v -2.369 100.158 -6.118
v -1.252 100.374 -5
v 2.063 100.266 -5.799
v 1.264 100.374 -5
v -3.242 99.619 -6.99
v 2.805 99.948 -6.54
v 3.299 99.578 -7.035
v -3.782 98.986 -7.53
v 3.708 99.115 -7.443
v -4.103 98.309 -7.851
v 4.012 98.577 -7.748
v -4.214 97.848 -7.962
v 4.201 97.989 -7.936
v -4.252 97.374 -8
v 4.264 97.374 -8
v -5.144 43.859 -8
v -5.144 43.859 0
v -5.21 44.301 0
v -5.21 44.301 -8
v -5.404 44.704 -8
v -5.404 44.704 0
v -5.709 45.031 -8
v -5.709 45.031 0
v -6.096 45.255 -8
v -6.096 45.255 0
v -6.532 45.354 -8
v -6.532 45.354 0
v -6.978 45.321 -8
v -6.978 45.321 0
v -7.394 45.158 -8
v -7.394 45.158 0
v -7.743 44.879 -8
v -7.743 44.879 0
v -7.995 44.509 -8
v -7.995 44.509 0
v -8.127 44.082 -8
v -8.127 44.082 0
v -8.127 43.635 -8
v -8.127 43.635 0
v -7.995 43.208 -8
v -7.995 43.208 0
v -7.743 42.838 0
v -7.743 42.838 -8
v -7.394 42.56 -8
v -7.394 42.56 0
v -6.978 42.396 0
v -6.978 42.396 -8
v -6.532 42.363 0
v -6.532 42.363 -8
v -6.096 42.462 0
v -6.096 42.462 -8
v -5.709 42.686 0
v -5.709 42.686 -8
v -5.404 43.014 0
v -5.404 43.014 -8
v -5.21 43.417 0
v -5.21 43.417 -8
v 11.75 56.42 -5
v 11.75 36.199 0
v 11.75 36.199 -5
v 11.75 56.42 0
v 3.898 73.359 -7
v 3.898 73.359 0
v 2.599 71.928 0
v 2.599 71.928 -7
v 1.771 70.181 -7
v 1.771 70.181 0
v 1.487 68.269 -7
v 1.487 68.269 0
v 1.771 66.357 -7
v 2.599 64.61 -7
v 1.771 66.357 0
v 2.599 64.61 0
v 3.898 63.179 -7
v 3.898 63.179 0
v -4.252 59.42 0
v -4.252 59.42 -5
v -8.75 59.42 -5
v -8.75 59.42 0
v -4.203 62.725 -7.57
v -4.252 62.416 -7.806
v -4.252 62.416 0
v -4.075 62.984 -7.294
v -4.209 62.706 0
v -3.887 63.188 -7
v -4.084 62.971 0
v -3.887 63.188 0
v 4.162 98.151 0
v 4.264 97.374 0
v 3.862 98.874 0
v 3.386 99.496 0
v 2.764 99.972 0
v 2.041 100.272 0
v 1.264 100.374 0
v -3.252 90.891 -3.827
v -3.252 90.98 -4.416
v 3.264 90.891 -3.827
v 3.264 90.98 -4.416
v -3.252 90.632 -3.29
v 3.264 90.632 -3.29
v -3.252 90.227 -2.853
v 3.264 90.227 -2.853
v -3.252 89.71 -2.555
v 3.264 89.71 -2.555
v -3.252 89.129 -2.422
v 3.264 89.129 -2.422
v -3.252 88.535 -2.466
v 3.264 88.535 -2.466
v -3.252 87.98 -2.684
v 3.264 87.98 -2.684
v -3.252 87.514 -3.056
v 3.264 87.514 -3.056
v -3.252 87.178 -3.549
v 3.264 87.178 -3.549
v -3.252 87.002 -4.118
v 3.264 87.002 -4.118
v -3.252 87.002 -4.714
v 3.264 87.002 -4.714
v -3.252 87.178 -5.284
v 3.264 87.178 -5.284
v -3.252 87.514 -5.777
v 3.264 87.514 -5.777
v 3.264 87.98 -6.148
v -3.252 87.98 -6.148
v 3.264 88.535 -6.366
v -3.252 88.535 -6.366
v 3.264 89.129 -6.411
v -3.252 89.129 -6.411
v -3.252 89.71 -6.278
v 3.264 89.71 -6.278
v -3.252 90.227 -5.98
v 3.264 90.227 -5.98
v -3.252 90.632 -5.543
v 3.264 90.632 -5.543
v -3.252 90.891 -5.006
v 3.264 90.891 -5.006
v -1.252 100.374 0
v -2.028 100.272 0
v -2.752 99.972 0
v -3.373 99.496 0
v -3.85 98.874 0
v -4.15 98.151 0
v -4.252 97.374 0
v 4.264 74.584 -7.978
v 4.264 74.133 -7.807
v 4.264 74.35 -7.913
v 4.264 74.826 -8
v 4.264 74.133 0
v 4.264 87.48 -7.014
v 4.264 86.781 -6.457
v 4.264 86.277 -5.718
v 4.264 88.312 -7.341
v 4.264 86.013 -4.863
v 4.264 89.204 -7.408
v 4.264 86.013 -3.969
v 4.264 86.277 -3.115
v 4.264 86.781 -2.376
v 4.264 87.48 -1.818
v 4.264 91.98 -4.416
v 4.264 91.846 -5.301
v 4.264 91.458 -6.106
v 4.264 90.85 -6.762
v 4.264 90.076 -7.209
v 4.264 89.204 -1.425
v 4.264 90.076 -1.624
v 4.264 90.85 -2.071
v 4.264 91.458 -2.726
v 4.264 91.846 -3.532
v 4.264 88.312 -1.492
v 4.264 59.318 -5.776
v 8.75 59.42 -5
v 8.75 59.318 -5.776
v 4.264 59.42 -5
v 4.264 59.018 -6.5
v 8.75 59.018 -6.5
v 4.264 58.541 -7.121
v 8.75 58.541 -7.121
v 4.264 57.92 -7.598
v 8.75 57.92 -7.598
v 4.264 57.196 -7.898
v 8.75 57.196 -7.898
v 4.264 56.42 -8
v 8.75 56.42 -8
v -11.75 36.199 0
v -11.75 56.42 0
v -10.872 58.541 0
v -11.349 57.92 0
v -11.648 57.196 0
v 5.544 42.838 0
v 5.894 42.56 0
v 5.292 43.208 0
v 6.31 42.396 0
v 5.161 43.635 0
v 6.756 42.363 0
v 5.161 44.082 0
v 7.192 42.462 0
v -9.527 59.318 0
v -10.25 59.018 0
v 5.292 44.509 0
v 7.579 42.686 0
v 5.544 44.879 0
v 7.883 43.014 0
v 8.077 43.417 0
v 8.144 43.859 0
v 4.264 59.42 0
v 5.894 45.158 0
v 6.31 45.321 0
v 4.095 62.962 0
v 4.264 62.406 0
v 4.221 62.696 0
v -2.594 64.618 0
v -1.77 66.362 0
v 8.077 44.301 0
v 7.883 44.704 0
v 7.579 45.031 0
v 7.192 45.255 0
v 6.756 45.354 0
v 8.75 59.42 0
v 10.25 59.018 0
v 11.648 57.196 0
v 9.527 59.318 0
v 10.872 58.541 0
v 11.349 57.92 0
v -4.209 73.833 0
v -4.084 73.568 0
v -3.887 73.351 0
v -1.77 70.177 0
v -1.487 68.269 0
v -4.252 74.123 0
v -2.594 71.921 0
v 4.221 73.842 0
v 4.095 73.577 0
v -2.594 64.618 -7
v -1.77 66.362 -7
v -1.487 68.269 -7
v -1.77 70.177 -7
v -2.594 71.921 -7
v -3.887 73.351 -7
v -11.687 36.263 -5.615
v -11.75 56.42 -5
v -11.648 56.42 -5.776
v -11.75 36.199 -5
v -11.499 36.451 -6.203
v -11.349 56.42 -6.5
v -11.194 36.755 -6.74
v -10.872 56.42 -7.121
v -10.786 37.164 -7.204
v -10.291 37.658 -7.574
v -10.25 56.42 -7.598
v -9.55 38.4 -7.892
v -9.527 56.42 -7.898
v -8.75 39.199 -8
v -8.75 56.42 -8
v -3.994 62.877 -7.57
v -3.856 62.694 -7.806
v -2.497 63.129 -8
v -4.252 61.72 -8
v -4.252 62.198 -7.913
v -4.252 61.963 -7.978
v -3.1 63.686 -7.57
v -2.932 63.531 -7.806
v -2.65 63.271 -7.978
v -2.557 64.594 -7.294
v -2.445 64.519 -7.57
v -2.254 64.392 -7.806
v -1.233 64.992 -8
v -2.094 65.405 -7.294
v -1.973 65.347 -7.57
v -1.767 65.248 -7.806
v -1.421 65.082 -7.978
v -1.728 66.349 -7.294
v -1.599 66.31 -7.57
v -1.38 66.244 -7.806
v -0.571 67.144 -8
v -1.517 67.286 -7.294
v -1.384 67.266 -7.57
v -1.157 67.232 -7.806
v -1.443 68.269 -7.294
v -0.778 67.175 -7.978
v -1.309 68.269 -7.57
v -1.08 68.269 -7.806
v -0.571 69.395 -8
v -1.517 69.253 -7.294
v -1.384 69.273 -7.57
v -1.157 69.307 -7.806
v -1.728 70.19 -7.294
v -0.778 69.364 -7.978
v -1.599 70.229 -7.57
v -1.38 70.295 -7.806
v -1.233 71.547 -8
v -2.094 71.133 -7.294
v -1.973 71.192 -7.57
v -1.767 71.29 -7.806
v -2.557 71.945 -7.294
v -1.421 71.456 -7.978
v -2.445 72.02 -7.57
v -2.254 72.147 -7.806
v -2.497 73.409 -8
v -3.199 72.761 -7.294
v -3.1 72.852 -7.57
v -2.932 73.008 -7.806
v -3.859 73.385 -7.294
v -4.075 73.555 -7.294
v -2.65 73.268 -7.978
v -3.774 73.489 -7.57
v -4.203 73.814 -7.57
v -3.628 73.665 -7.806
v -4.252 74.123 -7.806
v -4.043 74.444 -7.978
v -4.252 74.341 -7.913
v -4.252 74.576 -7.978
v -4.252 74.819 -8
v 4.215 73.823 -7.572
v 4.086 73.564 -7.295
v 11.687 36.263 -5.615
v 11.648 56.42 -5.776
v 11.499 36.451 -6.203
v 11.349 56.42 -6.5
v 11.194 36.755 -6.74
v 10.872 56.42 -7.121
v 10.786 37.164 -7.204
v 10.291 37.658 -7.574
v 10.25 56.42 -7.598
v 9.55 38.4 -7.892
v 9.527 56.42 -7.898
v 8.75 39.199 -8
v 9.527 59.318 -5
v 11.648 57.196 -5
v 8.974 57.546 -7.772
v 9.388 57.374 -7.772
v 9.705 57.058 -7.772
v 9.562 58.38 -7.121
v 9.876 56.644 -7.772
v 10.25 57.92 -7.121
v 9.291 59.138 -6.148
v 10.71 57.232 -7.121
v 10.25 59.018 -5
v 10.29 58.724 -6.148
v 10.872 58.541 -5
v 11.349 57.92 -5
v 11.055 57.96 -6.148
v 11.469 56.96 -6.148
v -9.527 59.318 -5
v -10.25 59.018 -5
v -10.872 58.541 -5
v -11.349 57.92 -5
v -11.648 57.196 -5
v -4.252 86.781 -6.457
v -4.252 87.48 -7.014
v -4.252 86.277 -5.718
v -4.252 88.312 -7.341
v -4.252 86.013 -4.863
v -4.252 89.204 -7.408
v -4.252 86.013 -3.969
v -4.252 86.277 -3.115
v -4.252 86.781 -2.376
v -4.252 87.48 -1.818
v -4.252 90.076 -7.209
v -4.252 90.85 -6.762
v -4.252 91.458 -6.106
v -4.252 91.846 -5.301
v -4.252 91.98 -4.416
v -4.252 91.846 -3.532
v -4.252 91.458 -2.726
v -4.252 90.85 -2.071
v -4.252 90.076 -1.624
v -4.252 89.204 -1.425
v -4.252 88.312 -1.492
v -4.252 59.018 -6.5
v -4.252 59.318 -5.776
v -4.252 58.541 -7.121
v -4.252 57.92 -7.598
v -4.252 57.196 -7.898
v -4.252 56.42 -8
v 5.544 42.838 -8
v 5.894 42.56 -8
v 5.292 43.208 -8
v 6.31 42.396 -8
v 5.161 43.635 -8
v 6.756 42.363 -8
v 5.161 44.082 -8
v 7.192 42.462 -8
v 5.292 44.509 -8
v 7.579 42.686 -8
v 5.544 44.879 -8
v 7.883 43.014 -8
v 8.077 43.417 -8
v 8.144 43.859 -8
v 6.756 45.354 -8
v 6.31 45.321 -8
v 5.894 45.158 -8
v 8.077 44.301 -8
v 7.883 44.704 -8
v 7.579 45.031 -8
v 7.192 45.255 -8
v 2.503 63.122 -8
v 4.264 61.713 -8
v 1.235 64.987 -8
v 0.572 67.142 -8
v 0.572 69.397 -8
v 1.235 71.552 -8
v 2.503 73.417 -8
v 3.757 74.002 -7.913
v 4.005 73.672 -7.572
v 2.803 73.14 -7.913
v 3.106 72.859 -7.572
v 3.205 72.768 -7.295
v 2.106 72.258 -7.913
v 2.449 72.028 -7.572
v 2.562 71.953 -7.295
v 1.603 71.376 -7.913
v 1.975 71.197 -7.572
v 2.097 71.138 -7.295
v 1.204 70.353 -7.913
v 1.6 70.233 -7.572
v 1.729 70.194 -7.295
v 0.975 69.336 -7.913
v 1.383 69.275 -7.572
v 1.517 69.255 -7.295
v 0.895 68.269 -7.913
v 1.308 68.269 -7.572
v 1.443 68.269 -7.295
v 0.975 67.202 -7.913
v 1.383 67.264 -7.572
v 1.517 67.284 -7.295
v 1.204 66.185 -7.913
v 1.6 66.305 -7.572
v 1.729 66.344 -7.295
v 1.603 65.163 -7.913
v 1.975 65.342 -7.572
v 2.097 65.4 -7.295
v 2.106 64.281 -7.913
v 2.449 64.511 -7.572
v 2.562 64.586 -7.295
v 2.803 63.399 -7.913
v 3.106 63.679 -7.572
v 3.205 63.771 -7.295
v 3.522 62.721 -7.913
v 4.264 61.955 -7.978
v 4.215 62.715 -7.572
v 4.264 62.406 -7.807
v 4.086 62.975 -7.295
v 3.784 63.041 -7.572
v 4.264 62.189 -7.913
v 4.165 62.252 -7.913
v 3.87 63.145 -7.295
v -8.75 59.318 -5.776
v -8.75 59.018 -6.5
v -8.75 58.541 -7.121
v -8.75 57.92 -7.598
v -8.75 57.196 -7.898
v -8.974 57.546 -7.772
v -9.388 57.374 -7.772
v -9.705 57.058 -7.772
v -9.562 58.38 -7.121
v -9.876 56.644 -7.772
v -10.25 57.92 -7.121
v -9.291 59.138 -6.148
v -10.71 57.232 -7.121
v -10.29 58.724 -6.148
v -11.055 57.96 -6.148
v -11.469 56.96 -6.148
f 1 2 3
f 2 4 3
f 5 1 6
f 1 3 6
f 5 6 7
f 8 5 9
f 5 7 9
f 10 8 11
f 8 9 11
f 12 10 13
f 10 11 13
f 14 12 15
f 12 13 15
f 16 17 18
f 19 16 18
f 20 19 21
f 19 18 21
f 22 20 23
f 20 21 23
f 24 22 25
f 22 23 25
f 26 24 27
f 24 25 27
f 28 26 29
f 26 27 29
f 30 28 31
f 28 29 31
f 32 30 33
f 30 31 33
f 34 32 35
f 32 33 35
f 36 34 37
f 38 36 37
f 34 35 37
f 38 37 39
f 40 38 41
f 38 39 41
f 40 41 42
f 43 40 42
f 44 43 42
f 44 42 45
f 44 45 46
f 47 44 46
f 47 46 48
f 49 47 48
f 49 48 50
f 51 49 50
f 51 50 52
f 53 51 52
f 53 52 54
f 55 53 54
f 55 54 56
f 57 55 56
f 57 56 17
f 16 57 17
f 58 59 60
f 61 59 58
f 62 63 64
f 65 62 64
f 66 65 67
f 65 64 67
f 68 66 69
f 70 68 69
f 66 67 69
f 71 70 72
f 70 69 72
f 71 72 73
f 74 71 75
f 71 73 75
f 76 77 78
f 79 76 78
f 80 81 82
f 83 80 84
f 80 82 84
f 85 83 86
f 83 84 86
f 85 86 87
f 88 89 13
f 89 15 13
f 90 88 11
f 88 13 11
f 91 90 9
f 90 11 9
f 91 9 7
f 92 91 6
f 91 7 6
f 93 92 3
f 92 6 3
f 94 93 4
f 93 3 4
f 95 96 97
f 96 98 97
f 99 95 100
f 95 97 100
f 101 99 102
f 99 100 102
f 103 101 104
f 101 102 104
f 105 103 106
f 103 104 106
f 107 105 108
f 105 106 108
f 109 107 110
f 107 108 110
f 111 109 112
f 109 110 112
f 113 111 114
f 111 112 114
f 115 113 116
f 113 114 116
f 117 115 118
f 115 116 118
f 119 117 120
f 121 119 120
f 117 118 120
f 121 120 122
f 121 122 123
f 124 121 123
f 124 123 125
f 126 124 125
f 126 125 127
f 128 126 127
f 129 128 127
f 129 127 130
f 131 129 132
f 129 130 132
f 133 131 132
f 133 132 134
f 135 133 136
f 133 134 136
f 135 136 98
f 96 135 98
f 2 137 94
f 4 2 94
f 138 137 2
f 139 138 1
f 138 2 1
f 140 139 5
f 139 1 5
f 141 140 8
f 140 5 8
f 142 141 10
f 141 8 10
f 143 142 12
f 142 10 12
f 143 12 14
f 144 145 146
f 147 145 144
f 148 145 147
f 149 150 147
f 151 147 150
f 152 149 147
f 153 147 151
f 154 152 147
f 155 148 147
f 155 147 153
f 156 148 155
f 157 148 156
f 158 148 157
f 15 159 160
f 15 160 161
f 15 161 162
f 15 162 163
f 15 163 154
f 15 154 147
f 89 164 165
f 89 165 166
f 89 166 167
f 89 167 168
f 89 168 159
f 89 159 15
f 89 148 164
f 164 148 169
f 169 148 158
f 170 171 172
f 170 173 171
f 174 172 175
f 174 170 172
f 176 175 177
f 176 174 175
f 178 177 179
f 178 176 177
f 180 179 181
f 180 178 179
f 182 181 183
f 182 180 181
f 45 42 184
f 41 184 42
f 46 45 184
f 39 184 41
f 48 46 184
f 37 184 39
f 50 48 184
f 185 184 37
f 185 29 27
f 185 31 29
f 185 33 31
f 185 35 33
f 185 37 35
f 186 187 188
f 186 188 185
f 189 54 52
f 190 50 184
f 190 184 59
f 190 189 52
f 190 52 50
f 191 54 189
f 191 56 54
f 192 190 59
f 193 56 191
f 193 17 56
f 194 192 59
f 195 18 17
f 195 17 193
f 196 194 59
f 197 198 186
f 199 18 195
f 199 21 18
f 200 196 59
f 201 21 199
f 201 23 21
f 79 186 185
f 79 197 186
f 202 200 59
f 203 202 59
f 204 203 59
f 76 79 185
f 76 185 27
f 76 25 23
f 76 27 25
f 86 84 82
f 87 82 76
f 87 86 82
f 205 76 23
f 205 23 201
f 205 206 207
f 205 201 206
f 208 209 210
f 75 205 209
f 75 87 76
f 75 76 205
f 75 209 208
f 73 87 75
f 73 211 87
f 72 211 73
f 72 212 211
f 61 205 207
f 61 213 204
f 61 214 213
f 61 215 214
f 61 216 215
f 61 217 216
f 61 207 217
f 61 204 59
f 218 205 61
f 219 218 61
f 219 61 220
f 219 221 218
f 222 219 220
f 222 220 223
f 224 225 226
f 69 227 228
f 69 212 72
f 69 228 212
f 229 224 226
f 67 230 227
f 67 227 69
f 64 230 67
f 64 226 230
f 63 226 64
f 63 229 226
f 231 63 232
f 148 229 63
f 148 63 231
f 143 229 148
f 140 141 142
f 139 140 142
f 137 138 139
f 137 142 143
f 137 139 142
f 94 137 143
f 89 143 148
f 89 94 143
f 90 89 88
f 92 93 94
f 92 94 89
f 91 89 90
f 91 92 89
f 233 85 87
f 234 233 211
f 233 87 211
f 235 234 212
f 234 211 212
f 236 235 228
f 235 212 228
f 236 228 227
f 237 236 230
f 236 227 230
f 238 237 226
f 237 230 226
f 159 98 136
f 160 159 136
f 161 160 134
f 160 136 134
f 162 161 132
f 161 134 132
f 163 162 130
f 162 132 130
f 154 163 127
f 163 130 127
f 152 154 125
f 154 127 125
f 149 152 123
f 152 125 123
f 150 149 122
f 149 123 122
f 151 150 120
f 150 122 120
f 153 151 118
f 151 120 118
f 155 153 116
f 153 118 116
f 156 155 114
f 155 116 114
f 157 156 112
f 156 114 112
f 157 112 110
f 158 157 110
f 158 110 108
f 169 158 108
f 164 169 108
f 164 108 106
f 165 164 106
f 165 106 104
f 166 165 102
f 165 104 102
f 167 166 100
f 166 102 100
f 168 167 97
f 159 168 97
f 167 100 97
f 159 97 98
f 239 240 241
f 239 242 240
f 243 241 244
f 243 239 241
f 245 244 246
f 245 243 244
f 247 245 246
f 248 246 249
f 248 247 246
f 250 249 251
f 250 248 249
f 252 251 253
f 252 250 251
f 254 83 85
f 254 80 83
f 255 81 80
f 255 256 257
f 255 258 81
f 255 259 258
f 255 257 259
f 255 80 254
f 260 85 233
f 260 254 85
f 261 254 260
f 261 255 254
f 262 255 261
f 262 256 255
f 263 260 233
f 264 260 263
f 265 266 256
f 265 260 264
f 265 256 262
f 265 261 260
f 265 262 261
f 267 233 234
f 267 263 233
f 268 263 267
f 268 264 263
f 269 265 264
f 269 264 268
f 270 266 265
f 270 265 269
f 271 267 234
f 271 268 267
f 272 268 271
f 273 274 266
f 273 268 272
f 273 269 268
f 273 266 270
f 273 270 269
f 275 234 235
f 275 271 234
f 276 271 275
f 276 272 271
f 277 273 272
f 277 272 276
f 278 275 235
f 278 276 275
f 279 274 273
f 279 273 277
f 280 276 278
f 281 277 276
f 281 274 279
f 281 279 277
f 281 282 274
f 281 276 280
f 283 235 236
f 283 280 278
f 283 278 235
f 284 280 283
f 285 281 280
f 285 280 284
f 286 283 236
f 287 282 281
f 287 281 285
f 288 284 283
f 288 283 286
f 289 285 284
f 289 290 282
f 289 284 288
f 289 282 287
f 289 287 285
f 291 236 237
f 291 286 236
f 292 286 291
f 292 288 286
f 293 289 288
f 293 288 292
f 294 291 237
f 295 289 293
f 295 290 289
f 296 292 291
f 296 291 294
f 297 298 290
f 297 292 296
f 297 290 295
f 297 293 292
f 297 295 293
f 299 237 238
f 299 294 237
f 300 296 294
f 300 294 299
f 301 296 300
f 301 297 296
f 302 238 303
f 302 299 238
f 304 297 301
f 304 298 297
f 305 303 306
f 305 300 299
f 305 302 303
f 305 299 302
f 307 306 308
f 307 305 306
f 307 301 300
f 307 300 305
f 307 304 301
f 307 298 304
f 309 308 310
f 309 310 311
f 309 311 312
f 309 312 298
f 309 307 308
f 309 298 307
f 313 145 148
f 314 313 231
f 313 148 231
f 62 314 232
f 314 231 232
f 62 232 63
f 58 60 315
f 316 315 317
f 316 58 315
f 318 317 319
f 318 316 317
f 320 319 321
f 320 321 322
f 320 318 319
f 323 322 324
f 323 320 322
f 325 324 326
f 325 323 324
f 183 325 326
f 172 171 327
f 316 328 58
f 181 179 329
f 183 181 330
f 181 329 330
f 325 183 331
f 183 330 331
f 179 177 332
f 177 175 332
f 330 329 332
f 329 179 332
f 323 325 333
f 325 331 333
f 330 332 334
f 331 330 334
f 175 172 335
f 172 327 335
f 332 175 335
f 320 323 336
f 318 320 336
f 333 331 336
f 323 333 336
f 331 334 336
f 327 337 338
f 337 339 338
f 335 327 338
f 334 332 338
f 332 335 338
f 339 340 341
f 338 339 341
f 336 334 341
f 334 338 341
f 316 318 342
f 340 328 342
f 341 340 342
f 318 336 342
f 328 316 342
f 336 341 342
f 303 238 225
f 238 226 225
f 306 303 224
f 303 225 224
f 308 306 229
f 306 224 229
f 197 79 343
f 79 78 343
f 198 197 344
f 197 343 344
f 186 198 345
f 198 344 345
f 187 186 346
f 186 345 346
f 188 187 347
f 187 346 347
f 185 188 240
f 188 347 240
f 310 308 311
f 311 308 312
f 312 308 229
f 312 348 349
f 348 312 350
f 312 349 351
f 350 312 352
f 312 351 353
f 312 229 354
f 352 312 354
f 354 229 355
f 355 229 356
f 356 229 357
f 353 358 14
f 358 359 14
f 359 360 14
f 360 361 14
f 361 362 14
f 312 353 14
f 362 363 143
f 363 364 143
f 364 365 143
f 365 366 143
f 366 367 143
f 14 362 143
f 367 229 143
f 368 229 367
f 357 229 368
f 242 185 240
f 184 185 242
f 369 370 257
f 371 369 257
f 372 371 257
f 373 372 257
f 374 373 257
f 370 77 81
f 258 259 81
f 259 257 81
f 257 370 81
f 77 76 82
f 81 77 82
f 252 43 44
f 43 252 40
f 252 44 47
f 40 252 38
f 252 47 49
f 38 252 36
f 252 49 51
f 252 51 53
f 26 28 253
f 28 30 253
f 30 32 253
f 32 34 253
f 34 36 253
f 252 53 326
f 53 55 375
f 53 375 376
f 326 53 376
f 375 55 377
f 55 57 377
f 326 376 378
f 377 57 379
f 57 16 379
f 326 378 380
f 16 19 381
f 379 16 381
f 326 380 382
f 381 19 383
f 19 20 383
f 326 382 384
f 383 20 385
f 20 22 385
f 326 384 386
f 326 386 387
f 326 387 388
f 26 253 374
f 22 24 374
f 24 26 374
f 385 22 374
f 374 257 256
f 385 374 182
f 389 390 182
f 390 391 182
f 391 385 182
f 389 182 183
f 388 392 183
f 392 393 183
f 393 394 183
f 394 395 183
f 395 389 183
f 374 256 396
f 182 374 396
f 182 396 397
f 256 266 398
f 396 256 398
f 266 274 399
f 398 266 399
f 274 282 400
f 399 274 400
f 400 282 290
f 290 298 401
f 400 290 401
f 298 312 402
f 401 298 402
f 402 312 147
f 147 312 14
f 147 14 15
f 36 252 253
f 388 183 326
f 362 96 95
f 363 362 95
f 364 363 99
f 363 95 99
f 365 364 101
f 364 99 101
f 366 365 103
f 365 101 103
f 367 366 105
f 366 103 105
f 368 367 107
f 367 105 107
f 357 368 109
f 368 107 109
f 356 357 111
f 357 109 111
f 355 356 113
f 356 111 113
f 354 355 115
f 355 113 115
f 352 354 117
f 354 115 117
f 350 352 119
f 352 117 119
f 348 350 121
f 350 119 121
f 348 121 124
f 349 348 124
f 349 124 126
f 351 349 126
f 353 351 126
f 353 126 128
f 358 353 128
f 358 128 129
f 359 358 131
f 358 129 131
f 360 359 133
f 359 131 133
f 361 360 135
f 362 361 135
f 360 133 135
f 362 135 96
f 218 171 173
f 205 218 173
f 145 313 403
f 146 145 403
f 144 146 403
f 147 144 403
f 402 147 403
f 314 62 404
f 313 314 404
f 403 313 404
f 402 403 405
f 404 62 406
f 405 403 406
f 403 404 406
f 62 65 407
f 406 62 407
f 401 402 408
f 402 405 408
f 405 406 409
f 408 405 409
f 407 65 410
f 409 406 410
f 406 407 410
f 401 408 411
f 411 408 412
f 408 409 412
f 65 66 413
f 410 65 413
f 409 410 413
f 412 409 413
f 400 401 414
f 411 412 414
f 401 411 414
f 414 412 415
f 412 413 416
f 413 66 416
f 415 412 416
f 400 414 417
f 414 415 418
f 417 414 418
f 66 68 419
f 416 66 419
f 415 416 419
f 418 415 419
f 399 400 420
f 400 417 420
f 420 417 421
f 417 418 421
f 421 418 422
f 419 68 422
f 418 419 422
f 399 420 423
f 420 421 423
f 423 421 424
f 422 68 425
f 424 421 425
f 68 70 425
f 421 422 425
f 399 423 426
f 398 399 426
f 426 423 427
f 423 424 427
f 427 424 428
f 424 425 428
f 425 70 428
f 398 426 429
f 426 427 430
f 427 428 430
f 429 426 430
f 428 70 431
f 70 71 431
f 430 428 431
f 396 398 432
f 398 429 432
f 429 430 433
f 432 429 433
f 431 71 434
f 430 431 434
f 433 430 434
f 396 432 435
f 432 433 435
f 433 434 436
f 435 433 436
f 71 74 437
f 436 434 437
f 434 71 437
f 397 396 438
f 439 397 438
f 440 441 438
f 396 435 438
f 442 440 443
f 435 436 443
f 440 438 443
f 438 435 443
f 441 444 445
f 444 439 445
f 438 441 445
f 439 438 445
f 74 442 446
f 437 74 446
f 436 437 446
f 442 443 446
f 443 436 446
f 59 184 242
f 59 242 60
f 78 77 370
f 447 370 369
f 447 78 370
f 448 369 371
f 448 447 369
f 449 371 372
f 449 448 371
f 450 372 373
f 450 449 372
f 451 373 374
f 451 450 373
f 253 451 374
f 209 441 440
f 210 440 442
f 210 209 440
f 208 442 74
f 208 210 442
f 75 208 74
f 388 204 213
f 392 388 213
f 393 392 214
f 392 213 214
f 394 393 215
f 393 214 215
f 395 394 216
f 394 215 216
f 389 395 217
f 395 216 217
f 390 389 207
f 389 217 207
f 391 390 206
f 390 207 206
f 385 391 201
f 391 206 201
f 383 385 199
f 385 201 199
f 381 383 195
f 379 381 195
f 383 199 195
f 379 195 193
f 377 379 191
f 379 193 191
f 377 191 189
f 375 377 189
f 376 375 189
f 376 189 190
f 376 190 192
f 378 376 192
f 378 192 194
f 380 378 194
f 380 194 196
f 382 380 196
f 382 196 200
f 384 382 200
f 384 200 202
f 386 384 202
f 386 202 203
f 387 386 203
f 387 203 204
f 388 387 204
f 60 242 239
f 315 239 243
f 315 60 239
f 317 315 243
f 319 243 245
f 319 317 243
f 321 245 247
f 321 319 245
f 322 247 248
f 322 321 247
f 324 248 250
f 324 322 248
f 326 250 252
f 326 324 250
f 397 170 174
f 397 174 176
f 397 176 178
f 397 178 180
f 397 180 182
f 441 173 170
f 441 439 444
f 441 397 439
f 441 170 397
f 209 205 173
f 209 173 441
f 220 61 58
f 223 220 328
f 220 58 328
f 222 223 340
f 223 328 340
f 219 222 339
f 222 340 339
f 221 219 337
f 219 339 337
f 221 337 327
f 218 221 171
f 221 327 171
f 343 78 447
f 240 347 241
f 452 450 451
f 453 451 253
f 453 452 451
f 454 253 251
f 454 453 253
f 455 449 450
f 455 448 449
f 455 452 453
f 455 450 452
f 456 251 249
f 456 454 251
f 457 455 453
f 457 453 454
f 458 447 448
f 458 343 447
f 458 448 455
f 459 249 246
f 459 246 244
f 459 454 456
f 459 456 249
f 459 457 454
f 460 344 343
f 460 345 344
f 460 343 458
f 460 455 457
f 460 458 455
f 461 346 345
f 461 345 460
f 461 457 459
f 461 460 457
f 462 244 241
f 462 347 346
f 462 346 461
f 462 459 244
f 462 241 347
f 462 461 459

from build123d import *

# Parameters (mm, degrees)
F0_W          = 8.5162539035
F0_H          = 18.7663150777
F0_H_2        = 40.954434668
F1_DEPTH      = 8
F2_R          = 3
F3_R          = 1.5
F4_DEPTH      = 25
F5_R          = 2
F6_DEPTH      = 13.4
F6_DEPTH_BACK = 25
F7_SIZE       = 1
F8_R          = 6.5791532239
F9_DEPTH      = 25
F10_R         = 1


with BuildPart() as f1:
    # F0 (on Top) → F1 (new body)
    with BuildSketch(Plane.XY):
        Polygon((11.7504801601, 36.198887974), (11.7504801601, 59.4197693529), (4.2642612243, 59.4197693529), (4.2642612243, 40.6534542753), (-4.2519926792, 40.6534542753), (-4.2519926792, 59.4197693529), (-11.7504801601, 59.4197693529), (-11.7504801601, 36.198887974), align=None)
        with Locations((0.0061342726, 50.0366118141)):
            Rectangle(F0_W, F0_H)
        with Locations((0.0061342726, 79.8969866869)):
            Rectangle(F0_W, F0_H_2)
    extrude(amount=-F1_DEPTH)

    # F2
    f2_edges = [f1.edges().sort_by_distance(p)[0] for p in [
        (-11.75048, 59.419769, -4),
        (11.75048, 59.419769, -4),
        (-4.251993, 100.374204, -4),
        (4.264261, 100.374204, -4),
        (0, 36.198888, -8),
        (-8.001236, 59.419769, -8),
        (8.007371, 59.419769, -8),
        (-11.75048, 47.809329, -8),
        (11.75048, 47.809329, -8),
        (0.006134, 100.374204, -8),
    ]]
    fillet(f2_edges, radius=F2_R)

    # F3 (on Top) → F4 (cut)
    with BuildSketch(Plane.XY):
        with Locations((-6.6438065842, 43.8586436212)):
            Circle(F3_R)
        with Locations((6.6438065842, 43.8586436212)):
            Circle(F3_R)
    extrude(amount=-F4_DEPTH, mode=Mode.SUBTRACT)

    # F5 (on Right) → F6 (cut, two sides)
    with BuildSketch(Plane.YZ) as f6_sk:
        with Locations((88.9796987176, -4.4162971899)):
            Circle(F5_R)
    extrude(amount=-F6_DEPTH, mode=Mode.SUBTRACT)
    extrude(f6_sk.sketch, amount=F6_DEPTH_BACK, mode=Mode.SUBTRACT)

    # F7
    f7_edges = [f1.edges().sort_by_distance(p)[0] for p in [
        (4.264261, 86.979699, -4.416297),
        (-4.251993, 86.979699, -4.416297),
    ]]
    chamfer(f7_edges, length=F7_SIZE)

    # F8 (on Top) → F9 (cut)
    with BuildSketch(Plane.XY):
        with Locations((8.0665275455, 68.2693198323)):
            Circle(F8_R)
        with Locations((-8.0665275455, 68.2693198323)):
            Circle(F8_R)
    extrude(amount=-F9_DEPTH, mode=Mode.SUBTRACT)

    # F10
    f10_edges = [f1.edges().sort_by_distance(p)[0] for p in [
        (-1.487374, 68.26932, -8),
        (1.487374, 68.26932, -8),
        (4.264261, 62.900146, -4),
        (4.264261, 73.638494, -4),
        (-4.251993, 62.908855, -4),
        (-4.251993, 73.629784, -4),
    ]]
    fillet(f10_edges, radius=F10_R)


solid = f1.part
